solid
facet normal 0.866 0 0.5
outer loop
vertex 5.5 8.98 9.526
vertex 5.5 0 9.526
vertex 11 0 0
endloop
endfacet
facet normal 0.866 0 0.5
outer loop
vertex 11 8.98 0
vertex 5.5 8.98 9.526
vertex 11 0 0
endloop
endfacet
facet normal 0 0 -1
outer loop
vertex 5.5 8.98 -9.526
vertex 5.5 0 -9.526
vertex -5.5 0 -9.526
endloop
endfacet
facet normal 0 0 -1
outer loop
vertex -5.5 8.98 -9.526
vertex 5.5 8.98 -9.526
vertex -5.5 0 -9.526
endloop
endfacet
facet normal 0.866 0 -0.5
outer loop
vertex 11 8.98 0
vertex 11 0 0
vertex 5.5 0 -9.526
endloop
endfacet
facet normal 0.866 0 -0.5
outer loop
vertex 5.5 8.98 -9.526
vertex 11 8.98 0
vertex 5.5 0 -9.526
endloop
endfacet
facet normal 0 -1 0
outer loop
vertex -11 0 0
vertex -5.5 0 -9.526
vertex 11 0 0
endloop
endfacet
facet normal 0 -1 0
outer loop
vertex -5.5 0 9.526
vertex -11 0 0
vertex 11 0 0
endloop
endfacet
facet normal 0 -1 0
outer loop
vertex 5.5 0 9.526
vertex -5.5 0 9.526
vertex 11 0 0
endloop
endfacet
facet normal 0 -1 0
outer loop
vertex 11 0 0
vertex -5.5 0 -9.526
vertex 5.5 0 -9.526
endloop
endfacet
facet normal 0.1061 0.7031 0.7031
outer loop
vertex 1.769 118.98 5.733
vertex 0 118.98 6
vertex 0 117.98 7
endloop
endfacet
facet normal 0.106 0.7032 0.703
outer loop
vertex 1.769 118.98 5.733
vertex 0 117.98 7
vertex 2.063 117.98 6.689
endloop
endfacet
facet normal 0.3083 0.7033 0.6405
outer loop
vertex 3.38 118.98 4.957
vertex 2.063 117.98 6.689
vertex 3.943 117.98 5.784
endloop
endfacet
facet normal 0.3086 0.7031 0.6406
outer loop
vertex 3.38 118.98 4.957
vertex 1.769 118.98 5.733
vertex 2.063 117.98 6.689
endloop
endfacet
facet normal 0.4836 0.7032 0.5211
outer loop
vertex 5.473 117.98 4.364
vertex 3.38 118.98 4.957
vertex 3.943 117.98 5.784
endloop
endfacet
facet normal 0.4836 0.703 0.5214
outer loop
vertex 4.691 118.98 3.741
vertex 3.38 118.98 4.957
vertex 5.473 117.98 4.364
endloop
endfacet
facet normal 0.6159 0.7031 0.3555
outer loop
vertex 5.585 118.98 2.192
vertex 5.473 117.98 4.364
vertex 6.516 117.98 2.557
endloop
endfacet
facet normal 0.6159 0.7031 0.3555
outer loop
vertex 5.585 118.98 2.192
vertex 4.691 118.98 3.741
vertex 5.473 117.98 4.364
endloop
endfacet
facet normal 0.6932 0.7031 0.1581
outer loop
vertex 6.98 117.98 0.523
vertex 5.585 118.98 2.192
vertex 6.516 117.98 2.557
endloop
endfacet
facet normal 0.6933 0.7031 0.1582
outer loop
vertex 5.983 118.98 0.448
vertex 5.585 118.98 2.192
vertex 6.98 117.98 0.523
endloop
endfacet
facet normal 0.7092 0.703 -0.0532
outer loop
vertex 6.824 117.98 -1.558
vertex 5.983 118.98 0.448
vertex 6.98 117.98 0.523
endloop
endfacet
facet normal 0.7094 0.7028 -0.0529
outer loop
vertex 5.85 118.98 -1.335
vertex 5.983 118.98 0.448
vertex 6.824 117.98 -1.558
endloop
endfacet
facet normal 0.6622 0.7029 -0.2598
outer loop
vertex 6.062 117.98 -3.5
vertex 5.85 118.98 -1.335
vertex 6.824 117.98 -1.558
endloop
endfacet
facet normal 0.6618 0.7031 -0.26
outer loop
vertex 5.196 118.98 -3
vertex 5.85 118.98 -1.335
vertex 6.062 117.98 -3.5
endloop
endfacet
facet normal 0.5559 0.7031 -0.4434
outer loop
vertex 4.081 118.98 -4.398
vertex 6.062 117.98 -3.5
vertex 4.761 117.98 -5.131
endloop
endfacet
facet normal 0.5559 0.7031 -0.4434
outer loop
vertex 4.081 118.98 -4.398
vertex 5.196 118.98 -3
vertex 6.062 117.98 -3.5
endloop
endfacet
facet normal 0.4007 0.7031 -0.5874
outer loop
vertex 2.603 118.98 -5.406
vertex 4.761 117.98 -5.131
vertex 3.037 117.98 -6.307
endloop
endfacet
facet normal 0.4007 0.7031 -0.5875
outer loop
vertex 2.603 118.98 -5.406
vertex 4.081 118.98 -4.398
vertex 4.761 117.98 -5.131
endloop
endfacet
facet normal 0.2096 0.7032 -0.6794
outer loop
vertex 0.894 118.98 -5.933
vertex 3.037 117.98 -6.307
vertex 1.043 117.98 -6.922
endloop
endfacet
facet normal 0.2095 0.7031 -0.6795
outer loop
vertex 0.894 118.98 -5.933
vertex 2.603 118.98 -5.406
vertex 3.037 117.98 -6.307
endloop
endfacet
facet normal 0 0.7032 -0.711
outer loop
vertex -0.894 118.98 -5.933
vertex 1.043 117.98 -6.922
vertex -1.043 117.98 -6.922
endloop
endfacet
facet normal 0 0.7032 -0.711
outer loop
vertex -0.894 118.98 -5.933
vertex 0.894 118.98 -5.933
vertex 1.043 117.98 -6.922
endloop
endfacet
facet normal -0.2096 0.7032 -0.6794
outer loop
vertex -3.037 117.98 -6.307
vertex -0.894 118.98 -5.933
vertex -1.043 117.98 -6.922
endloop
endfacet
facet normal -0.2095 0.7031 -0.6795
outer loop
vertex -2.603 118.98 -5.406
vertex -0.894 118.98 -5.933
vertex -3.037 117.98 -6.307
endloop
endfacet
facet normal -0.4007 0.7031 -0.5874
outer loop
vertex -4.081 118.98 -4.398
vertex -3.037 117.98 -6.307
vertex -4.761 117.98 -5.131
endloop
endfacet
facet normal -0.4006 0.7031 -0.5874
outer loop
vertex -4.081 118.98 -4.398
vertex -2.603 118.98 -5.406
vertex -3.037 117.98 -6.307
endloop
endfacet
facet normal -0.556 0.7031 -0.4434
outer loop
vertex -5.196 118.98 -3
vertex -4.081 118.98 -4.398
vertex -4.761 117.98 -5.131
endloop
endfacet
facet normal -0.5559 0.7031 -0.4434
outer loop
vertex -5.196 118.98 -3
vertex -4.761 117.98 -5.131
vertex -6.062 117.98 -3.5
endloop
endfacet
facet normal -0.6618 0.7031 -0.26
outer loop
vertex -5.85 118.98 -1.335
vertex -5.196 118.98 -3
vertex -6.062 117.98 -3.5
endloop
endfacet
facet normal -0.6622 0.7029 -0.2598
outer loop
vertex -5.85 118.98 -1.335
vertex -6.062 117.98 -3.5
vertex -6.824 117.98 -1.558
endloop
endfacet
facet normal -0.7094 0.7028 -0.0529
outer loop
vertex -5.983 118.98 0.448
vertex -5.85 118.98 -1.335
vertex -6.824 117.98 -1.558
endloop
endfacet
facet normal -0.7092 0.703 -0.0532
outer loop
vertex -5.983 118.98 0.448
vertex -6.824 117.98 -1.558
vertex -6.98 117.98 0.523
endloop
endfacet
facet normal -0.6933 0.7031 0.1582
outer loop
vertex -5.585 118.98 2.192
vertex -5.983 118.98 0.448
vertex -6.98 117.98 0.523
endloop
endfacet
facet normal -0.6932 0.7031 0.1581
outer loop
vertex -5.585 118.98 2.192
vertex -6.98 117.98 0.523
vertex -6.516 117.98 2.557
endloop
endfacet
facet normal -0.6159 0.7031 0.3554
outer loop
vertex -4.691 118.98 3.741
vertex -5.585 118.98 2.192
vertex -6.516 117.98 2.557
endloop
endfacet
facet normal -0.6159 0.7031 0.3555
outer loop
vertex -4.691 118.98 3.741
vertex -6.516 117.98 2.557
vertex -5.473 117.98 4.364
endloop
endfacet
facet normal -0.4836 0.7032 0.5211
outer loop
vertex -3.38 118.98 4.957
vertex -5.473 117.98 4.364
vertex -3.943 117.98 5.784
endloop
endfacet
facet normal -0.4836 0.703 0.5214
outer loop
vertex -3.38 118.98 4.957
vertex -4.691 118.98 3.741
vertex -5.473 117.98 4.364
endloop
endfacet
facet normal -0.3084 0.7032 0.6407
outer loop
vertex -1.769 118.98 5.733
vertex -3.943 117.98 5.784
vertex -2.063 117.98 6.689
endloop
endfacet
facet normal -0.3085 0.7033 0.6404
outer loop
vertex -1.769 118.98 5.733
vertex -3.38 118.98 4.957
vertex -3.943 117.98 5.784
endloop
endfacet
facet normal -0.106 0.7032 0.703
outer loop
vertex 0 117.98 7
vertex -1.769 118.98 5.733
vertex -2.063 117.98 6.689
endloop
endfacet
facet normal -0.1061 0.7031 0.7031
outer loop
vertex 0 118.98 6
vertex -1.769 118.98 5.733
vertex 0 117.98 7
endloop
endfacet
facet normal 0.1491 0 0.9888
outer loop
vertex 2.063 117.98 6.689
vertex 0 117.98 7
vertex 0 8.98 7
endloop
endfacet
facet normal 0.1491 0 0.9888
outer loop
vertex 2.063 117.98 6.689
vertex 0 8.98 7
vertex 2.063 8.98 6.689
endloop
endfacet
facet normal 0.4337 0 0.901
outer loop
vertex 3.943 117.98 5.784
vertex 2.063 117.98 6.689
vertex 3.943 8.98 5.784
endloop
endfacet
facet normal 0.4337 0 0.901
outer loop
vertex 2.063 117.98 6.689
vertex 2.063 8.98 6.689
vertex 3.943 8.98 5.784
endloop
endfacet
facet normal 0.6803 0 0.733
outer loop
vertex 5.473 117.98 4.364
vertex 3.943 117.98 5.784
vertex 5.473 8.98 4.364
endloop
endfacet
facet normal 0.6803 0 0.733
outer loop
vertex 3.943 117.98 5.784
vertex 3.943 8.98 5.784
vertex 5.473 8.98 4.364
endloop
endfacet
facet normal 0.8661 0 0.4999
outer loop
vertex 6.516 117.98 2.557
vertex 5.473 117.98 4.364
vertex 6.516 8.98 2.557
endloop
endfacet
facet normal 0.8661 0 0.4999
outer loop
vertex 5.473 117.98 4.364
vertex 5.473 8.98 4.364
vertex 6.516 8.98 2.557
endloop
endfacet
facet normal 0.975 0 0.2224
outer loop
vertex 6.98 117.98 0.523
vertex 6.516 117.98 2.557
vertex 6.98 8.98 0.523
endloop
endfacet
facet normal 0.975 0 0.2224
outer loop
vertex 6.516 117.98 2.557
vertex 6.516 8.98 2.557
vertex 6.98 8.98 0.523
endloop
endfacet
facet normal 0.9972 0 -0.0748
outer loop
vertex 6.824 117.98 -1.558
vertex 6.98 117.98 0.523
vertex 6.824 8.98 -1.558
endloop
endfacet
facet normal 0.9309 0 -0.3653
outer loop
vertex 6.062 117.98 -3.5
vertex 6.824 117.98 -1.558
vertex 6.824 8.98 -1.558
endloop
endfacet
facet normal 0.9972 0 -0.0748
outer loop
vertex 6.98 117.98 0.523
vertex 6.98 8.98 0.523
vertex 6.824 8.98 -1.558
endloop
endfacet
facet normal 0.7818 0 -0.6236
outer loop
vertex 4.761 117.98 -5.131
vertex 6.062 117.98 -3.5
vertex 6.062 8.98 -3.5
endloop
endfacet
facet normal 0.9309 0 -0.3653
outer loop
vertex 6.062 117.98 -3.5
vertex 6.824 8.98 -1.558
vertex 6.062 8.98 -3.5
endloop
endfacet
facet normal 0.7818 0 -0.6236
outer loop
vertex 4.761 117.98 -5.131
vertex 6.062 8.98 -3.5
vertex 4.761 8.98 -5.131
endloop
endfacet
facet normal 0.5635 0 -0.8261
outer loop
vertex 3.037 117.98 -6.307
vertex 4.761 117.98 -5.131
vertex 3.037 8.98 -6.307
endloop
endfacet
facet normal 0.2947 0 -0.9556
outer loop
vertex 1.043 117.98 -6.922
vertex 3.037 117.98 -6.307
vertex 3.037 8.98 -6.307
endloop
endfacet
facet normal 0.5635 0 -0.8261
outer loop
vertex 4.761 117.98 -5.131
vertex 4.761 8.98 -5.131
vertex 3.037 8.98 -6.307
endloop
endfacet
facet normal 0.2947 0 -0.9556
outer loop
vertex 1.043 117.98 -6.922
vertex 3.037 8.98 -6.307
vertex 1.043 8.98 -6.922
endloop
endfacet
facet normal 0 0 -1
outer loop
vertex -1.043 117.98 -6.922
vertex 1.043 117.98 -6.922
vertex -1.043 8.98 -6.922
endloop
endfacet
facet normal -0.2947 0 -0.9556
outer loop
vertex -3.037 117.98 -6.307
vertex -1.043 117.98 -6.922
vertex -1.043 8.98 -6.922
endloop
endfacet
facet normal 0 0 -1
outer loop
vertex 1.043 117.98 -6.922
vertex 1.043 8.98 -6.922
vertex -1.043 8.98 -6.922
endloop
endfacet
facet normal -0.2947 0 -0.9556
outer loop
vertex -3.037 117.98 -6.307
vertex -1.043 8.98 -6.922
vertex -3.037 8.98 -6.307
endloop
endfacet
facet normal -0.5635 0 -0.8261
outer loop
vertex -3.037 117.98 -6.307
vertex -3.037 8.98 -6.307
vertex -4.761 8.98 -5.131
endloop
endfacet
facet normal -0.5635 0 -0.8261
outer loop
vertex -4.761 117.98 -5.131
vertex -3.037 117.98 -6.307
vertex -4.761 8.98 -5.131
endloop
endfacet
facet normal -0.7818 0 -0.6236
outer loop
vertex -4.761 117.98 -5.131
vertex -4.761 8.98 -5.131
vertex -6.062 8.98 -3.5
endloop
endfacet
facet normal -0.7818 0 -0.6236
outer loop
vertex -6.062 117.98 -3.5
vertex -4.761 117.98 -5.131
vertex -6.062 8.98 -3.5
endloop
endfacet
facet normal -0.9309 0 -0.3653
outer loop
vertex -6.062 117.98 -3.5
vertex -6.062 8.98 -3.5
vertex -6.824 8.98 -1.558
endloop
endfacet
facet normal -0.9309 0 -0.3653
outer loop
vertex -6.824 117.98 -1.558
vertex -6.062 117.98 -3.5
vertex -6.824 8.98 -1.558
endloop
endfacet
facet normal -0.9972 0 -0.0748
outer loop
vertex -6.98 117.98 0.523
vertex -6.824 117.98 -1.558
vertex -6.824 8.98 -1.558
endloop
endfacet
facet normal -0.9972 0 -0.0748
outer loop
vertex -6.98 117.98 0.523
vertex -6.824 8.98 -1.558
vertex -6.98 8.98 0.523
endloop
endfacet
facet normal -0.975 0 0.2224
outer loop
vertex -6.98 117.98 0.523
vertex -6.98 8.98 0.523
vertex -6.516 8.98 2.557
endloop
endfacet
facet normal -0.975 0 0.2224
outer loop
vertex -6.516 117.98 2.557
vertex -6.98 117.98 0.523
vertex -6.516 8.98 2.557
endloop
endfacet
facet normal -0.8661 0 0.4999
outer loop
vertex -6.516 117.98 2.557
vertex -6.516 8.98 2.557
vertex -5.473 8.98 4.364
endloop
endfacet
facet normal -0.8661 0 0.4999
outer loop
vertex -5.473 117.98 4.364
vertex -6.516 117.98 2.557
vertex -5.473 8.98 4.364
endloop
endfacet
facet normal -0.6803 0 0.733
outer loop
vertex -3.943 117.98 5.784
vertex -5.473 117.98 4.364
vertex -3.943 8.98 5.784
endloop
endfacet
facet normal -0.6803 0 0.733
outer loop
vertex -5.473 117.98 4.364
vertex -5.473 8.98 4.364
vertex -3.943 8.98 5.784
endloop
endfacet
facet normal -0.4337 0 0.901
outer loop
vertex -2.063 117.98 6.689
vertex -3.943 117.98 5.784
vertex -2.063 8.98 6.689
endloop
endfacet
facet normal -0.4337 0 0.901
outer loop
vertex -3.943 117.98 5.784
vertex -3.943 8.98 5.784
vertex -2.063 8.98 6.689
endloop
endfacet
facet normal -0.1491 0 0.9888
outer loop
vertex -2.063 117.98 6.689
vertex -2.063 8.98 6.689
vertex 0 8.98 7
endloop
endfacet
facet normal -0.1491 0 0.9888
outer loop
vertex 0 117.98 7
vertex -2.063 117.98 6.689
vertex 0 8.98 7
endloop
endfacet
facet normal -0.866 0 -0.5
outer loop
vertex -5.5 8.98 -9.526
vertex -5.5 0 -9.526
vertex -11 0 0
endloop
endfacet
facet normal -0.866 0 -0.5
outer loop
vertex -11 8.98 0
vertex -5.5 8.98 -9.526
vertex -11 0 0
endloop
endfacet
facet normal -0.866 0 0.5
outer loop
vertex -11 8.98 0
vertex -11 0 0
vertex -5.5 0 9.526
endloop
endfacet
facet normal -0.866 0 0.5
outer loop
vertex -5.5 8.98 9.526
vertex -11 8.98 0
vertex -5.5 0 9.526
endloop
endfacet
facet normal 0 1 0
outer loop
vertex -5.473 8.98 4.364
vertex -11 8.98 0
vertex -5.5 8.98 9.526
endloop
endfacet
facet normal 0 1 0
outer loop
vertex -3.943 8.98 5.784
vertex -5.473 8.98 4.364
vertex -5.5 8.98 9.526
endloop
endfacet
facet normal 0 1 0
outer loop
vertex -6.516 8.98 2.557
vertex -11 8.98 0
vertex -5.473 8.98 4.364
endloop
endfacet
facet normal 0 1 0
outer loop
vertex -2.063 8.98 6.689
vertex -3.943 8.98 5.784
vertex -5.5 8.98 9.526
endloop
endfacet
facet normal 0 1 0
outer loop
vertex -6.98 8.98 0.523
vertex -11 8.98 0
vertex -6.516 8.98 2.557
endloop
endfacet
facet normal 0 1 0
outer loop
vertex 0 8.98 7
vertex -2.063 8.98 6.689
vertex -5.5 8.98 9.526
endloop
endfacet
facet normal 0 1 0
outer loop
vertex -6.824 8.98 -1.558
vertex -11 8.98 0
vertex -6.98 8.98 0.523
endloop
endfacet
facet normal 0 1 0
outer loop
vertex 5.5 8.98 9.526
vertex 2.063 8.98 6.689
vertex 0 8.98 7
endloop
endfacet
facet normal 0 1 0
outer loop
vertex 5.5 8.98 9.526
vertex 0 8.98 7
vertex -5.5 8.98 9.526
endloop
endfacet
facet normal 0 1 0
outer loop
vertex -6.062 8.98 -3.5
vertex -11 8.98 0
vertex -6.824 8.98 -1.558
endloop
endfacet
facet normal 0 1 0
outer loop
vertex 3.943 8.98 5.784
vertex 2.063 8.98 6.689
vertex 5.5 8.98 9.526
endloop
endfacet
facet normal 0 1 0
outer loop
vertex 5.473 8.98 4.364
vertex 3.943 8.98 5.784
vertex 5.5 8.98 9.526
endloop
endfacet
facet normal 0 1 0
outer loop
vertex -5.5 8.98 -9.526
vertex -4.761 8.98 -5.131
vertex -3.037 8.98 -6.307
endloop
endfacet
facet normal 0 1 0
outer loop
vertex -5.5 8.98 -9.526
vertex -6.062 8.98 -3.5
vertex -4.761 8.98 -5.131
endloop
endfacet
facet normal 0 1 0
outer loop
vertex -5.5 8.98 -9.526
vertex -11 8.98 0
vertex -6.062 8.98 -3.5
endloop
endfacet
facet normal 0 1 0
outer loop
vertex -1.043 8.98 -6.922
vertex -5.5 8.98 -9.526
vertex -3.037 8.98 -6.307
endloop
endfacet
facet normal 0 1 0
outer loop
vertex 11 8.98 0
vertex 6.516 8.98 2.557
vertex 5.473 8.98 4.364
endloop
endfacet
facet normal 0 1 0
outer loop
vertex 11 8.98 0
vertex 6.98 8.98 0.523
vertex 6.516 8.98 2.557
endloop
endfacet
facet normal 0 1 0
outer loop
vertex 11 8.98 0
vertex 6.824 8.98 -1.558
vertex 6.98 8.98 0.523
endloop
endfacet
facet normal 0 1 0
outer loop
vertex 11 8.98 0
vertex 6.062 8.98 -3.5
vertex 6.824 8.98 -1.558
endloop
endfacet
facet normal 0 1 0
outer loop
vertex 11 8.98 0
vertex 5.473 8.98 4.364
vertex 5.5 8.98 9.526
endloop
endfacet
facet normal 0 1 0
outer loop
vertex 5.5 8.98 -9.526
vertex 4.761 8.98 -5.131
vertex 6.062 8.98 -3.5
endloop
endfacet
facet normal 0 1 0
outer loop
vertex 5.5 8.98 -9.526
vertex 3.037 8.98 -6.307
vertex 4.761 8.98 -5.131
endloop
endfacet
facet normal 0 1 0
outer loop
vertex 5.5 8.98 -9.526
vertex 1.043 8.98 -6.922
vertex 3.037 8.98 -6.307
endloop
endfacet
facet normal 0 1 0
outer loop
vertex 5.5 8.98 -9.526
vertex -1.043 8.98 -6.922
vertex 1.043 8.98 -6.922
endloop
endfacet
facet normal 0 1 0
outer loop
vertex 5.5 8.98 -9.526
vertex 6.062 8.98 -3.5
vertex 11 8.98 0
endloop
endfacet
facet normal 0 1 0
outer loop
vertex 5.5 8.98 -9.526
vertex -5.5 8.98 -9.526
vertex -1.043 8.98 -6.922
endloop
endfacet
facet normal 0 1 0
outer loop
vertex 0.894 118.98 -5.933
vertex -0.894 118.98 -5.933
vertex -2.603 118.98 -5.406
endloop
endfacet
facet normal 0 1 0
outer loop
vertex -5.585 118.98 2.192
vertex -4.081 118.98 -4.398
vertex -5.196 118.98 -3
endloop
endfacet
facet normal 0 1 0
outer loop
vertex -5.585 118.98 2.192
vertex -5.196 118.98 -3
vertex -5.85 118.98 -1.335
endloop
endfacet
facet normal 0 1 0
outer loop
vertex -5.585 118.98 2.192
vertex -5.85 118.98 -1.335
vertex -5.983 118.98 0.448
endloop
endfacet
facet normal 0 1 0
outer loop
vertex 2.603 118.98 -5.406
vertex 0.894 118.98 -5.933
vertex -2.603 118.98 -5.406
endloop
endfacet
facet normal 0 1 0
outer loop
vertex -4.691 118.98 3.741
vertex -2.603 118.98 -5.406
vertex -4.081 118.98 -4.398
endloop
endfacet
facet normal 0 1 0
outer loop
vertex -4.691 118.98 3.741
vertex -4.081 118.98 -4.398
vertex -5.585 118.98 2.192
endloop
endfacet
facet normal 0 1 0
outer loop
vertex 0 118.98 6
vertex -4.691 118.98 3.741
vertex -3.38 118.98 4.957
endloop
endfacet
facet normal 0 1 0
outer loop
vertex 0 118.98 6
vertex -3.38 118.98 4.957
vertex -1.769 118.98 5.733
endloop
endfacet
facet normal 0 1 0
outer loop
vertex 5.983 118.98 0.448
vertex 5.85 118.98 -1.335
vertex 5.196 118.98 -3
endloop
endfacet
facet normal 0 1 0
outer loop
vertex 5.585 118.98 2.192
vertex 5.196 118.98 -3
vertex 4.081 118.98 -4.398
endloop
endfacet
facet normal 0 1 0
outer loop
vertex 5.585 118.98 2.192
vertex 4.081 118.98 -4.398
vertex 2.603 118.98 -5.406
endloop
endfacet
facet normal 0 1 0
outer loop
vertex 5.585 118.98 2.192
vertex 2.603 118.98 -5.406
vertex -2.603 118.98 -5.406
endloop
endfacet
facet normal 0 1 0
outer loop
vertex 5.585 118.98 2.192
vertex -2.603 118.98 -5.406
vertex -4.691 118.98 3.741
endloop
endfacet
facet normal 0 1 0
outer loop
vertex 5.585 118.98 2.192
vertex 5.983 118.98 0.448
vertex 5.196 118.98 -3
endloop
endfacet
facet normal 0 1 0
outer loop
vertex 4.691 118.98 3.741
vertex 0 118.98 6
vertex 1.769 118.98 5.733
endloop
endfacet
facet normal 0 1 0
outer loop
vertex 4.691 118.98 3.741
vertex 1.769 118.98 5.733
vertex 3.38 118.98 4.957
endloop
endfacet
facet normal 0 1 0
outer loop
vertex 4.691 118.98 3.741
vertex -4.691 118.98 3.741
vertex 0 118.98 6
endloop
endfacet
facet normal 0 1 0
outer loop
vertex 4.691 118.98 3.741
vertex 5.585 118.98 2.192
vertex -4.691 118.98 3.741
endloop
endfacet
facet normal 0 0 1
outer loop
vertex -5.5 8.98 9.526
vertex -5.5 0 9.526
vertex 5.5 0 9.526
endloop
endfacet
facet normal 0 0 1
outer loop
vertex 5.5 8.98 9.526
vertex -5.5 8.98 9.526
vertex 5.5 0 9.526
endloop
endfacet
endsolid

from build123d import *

# Parameters (mm, degrees)
SALIENTE_EXTRUIR1_DEPTH = 8.98
CROQUIS2_R              = 7
SALIENTE_EXTRUIR3_DEPTH = 110
CHAFL_N4_SIZE           = 1


with BuildPart() as part:
    # Croquis1 → Saliente-Extruir1 (new body)
    with BuildSketch(Plane(origin=(0, 0, 0), x_dir=(1, 0, 0), z_dir=(0, 1, 0))):
        Polygon((11, 0), (5.5, 9.526279442), (-5.5, 9.526279442), (-11, 0), (-5.5, -9.526279442), (5.5, -9.526279442), align=None)
    extrude(amount=SALIENTE_EXTRUIR1_DEPTH)

    # Croquis2 → Saliente-Extruir3 (add)
    with BuildSketch(Plane(origin=(0, 8.98, 0), x_dir=(1, 0, 0), z_dir=(0, 1, 0))):
        with Locations(Location((0, 0, 0), (0, 0, 270))):
            Circle(CROQUIS2_R)
    extrude(amount=SALIENTE_EXTRUIR3_DEPTH)

    # Chaflán4
    chafl_n4_edges = [part.edges().sort_by_distance(p)[0] for p in [
        (0, 118.98, -7),
    ]]
    chamfer(chafl_n4_edges, length=CHAFL_N4_SIZE)


solid = part.part
